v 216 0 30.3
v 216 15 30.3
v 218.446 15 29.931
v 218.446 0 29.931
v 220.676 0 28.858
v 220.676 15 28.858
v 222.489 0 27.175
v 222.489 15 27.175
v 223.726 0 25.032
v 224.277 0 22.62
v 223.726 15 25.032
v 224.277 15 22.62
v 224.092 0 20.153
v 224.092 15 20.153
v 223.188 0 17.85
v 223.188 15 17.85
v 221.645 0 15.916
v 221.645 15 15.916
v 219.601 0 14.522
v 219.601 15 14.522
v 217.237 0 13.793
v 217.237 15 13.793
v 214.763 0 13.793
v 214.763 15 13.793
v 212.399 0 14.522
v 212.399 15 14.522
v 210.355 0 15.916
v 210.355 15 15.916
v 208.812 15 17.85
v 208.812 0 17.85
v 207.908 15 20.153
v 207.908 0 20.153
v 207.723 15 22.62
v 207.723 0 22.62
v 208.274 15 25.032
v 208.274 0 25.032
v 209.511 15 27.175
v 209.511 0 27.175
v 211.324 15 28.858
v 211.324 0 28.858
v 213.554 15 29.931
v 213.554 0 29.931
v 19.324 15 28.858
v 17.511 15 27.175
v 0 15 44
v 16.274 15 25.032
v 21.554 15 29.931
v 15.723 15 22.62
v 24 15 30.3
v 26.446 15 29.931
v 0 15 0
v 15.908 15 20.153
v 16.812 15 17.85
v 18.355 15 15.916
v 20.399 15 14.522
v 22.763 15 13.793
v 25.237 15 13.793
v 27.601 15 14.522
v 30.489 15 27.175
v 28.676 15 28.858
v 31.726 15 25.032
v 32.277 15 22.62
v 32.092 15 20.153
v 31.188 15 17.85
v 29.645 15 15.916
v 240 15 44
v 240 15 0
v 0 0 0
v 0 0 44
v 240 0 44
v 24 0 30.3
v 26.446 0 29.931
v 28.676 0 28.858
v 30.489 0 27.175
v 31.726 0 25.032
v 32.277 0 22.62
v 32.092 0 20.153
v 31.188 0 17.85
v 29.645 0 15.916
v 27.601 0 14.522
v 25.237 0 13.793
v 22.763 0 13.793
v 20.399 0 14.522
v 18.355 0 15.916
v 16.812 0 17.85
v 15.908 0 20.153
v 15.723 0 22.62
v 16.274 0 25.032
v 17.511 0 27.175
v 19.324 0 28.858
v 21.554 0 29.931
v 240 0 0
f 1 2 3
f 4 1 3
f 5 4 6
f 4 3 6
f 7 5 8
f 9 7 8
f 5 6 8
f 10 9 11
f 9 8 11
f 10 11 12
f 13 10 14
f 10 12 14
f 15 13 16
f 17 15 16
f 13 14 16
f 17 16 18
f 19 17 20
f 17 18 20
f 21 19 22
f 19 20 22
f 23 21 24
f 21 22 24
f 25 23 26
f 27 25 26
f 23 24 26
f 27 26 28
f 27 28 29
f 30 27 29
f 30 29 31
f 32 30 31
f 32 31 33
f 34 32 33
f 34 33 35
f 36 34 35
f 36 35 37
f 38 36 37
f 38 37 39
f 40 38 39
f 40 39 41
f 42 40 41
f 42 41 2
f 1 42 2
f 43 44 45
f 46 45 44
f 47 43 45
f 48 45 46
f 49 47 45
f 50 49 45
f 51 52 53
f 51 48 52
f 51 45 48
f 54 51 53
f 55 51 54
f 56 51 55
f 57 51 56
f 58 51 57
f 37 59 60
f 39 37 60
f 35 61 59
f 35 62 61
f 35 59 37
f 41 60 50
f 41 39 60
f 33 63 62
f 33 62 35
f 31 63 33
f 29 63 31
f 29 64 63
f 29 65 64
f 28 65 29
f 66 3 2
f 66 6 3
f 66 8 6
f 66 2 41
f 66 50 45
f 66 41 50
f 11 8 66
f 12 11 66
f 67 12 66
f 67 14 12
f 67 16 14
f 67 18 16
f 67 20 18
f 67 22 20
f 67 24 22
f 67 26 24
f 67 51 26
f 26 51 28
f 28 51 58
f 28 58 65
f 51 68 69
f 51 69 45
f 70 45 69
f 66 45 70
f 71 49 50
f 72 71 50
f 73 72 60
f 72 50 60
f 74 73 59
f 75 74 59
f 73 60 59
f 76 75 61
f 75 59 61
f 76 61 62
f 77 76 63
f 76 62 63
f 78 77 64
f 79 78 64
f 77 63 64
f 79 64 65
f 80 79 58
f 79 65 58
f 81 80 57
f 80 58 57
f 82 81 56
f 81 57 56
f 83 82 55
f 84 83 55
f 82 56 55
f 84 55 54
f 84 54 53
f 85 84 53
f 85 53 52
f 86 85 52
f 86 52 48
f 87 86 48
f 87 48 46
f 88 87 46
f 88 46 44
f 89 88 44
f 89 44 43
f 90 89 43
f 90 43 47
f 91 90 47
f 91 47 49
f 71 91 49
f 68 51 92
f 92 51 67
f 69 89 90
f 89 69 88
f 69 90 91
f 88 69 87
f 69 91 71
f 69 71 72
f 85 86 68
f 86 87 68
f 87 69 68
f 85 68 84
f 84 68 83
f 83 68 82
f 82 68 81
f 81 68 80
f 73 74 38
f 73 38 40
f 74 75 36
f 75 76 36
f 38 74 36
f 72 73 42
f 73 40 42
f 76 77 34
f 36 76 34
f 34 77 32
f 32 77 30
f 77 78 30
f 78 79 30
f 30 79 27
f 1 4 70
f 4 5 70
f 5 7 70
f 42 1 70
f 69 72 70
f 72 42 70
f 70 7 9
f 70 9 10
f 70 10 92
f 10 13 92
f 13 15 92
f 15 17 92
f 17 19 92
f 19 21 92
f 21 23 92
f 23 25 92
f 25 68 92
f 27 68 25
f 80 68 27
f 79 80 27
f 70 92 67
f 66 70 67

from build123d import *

# Parameters (mm, degrees)
SKETCH_1_W          = 240
SKETCH_1_H          = 15
TOP_BEAM_DEPTH      = 44
SKETCH_2_R          = 8.3
SCREW_PASSAGE_DEPTH = 245.460630777
SKETCH_3_R          = 8.3
CUT_EXTRUDE_2_DEPTH = 245.460630777


with BuildPart() as part:
    # 草图1 → Top_beam (new body)
    with BuildSketch(Plane.XY):
        with Locations((120, 7.5)):
            Rectangle(SKETCH_1_W, SKETCH_1_H)
    extrude(amount=TOP_BEAM_DEPTH)

    # 草图2 → Screw_passage (cut, through all)
    with BuildSketch(Plane(origin=(0, 15, 0), x_dir=(1, 0, 0), z_dir=(0, 1, 0))):
        with Locations(Location((24, -22, 0), (0, 0, 270))):
            Circle(SKETCH_2_R)
    extrude(amount=-SCREW_PASSAGE_DEPTH, mode=Mode.SUBTRACT)

    # 草图3 → 切除-拉伸2 (cut, through all)
    with BuildSketch(Plane(origin=(0, 15, 0), x_dir=(1, 0, 0), z_dir=(0, 1, 0))):
        with Locations(Location((216, -22, 0), (0, 0, 270))):
            Circle(SKETCH_3_R)
    extrude(amount=-CUT_EXTRUDE_2_DEPTH, mode=Mode.SUBTRACT)


solid = part.part
